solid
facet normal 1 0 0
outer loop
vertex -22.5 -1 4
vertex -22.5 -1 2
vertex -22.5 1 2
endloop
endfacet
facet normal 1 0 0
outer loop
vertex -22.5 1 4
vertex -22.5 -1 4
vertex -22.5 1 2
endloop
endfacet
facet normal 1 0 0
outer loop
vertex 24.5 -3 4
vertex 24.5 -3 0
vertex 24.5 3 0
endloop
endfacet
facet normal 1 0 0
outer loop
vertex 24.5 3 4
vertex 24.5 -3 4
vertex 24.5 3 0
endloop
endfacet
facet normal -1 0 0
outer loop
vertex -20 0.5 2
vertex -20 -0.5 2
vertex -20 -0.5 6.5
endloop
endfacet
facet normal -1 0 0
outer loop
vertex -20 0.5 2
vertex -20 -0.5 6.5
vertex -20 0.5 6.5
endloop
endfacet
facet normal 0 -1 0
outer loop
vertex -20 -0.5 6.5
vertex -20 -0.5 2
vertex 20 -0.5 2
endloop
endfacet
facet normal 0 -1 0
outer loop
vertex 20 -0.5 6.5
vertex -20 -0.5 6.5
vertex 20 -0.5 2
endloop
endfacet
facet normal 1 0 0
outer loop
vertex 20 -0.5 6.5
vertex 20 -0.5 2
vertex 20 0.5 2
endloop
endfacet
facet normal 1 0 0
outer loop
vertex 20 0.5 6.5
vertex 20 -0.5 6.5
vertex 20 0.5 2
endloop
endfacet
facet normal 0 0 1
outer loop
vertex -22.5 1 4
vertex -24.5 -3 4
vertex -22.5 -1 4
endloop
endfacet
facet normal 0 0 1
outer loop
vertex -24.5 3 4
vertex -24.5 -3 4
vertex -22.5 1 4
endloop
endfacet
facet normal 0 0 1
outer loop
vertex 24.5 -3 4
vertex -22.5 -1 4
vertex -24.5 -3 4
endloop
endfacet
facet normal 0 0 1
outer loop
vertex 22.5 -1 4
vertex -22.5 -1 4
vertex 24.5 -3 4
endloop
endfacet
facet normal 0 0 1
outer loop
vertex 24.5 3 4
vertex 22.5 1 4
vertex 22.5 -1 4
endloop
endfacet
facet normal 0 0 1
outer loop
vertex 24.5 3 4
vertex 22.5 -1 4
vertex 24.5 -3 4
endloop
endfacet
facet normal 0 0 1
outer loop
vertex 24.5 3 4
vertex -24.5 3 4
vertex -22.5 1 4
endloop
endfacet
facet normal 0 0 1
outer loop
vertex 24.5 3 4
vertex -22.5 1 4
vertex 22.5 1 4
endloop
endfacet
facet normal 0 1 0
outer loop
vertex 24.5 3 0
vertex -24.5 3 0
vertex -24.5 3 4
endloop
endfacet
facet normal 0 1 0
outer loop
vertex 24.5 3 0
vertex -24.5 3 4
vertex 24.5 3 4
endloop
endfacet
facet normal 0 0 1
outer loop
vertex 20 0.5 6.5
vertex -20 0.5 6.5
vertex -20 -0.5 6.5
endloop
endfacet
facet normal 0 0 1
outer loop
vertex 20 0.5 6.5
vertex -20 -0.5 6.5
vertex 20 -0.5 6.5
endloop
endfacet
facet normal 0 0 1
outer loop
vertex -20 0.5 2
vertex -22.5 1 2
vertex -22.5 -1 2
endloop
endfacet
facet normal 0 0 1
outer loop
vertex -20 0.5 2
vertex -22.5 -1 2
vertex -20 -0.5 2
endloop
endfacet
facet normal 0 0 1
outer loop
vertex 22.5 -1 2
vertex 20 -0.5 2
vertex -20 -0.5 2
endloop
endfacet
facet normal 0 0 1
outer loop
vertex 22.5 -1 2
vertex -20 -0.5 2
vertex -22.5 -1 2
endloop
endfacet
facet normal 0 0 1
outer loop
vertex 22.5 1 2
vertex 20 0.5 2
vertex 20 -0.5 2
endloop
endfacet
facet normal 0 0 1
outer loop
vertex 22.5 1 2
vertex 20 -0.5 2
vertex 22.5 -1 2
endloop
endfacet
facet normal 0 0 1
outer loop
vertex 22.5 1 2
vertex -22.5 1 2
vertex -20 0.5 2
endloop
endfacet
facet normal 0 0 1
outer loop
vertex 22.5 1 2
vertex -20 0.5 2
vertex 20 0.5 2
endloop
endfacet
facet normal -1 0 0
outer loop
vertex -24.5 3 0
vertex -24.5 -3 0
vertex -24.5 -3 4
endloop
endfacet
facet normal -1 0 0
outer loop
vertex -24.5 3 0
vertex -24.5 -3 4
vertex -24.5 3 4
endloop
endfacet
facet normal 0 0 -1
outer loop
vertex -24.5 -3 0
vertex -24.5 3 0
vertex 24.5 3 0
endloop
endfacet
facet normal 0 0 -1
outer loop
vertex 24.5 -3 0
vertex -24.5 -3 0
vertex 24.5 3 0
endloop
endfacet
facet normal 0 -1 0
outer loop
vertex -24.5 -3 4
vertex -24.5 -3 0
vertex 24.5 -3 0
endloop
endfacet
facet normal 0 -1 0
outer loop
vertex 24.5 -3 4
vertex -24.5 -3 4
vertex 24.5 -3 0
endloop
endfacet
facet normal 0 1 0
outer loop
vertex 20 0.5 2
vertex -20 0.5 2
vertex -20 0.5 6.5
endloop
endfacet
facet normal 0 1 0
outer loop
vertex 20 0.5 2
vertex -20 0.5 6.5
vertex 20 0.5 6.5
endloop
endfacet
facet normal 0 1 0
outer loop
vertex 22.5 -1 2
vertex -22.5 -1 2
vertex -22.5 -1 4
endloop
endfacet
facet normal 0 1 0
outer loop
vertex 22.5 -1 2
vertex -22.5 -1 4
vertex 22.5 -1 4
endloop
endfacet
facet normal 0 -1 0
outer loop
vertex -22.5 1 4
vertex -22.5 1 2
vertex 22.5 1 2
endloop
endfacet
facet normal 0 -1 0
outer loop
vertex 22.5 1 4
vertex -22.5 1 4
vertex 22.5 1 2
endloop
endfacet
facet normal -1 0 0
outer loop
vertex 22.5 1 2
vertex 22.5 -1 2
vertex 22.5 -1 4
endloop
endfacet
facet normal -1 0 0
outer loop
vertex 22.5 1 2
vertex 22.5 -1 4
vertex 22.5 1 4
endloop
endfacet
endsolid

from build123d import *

# Parameters (mm, degrees)
SKETCH1_W           = 45
SKETCH1_H           = 2
BOSS_EXTRUDE1_DEPTH = 2
SKETCH1_3_W         = 49
SKETCH1_3_H         = 6
SKETCH1_3_W_2       = 45
SKETCH1_3_H_2       = 2
BOSS_EXTRUDE2_DEPTH = 4
SKETCH2_W           = 40
SKETCH2_H           = 1
BOSS_EXTRUDE3_DEPTH = 4.5


with BuildPart() as part:
    # Sketch1 → Boss-Extrude1 (new body)
    with BuildSketch(Plane.XY):
        Rectangle(SKETCH1_W, SKETCH1_H)
    extrude(amount=BOSS_EXTRUDE1_DEPTH)

    # Sketch1<3> → Boss-Extrude2 (add)
    with BuildSketch(Plane.XY):
        Rectangle(SKETCH1_3_W, SKETCH1_3_H)
        Rectangle(SKETCH1_3_W_2, SKETCH1_3_H_2, mode=Mode.SUBTRACT)
    extrude(amount=BOSS_EXTRUDE2_DEPTH)

    # Sketch2 → Boss-Extrude3 (add)
    with BuildSketch(Plane.XY.offset(2)):
        Rectangle(SKETCH2_W, SKETCH2_H)
    extrude(amount=BOSS_EXTRUDE3_DEPTH)


solid = part.part
